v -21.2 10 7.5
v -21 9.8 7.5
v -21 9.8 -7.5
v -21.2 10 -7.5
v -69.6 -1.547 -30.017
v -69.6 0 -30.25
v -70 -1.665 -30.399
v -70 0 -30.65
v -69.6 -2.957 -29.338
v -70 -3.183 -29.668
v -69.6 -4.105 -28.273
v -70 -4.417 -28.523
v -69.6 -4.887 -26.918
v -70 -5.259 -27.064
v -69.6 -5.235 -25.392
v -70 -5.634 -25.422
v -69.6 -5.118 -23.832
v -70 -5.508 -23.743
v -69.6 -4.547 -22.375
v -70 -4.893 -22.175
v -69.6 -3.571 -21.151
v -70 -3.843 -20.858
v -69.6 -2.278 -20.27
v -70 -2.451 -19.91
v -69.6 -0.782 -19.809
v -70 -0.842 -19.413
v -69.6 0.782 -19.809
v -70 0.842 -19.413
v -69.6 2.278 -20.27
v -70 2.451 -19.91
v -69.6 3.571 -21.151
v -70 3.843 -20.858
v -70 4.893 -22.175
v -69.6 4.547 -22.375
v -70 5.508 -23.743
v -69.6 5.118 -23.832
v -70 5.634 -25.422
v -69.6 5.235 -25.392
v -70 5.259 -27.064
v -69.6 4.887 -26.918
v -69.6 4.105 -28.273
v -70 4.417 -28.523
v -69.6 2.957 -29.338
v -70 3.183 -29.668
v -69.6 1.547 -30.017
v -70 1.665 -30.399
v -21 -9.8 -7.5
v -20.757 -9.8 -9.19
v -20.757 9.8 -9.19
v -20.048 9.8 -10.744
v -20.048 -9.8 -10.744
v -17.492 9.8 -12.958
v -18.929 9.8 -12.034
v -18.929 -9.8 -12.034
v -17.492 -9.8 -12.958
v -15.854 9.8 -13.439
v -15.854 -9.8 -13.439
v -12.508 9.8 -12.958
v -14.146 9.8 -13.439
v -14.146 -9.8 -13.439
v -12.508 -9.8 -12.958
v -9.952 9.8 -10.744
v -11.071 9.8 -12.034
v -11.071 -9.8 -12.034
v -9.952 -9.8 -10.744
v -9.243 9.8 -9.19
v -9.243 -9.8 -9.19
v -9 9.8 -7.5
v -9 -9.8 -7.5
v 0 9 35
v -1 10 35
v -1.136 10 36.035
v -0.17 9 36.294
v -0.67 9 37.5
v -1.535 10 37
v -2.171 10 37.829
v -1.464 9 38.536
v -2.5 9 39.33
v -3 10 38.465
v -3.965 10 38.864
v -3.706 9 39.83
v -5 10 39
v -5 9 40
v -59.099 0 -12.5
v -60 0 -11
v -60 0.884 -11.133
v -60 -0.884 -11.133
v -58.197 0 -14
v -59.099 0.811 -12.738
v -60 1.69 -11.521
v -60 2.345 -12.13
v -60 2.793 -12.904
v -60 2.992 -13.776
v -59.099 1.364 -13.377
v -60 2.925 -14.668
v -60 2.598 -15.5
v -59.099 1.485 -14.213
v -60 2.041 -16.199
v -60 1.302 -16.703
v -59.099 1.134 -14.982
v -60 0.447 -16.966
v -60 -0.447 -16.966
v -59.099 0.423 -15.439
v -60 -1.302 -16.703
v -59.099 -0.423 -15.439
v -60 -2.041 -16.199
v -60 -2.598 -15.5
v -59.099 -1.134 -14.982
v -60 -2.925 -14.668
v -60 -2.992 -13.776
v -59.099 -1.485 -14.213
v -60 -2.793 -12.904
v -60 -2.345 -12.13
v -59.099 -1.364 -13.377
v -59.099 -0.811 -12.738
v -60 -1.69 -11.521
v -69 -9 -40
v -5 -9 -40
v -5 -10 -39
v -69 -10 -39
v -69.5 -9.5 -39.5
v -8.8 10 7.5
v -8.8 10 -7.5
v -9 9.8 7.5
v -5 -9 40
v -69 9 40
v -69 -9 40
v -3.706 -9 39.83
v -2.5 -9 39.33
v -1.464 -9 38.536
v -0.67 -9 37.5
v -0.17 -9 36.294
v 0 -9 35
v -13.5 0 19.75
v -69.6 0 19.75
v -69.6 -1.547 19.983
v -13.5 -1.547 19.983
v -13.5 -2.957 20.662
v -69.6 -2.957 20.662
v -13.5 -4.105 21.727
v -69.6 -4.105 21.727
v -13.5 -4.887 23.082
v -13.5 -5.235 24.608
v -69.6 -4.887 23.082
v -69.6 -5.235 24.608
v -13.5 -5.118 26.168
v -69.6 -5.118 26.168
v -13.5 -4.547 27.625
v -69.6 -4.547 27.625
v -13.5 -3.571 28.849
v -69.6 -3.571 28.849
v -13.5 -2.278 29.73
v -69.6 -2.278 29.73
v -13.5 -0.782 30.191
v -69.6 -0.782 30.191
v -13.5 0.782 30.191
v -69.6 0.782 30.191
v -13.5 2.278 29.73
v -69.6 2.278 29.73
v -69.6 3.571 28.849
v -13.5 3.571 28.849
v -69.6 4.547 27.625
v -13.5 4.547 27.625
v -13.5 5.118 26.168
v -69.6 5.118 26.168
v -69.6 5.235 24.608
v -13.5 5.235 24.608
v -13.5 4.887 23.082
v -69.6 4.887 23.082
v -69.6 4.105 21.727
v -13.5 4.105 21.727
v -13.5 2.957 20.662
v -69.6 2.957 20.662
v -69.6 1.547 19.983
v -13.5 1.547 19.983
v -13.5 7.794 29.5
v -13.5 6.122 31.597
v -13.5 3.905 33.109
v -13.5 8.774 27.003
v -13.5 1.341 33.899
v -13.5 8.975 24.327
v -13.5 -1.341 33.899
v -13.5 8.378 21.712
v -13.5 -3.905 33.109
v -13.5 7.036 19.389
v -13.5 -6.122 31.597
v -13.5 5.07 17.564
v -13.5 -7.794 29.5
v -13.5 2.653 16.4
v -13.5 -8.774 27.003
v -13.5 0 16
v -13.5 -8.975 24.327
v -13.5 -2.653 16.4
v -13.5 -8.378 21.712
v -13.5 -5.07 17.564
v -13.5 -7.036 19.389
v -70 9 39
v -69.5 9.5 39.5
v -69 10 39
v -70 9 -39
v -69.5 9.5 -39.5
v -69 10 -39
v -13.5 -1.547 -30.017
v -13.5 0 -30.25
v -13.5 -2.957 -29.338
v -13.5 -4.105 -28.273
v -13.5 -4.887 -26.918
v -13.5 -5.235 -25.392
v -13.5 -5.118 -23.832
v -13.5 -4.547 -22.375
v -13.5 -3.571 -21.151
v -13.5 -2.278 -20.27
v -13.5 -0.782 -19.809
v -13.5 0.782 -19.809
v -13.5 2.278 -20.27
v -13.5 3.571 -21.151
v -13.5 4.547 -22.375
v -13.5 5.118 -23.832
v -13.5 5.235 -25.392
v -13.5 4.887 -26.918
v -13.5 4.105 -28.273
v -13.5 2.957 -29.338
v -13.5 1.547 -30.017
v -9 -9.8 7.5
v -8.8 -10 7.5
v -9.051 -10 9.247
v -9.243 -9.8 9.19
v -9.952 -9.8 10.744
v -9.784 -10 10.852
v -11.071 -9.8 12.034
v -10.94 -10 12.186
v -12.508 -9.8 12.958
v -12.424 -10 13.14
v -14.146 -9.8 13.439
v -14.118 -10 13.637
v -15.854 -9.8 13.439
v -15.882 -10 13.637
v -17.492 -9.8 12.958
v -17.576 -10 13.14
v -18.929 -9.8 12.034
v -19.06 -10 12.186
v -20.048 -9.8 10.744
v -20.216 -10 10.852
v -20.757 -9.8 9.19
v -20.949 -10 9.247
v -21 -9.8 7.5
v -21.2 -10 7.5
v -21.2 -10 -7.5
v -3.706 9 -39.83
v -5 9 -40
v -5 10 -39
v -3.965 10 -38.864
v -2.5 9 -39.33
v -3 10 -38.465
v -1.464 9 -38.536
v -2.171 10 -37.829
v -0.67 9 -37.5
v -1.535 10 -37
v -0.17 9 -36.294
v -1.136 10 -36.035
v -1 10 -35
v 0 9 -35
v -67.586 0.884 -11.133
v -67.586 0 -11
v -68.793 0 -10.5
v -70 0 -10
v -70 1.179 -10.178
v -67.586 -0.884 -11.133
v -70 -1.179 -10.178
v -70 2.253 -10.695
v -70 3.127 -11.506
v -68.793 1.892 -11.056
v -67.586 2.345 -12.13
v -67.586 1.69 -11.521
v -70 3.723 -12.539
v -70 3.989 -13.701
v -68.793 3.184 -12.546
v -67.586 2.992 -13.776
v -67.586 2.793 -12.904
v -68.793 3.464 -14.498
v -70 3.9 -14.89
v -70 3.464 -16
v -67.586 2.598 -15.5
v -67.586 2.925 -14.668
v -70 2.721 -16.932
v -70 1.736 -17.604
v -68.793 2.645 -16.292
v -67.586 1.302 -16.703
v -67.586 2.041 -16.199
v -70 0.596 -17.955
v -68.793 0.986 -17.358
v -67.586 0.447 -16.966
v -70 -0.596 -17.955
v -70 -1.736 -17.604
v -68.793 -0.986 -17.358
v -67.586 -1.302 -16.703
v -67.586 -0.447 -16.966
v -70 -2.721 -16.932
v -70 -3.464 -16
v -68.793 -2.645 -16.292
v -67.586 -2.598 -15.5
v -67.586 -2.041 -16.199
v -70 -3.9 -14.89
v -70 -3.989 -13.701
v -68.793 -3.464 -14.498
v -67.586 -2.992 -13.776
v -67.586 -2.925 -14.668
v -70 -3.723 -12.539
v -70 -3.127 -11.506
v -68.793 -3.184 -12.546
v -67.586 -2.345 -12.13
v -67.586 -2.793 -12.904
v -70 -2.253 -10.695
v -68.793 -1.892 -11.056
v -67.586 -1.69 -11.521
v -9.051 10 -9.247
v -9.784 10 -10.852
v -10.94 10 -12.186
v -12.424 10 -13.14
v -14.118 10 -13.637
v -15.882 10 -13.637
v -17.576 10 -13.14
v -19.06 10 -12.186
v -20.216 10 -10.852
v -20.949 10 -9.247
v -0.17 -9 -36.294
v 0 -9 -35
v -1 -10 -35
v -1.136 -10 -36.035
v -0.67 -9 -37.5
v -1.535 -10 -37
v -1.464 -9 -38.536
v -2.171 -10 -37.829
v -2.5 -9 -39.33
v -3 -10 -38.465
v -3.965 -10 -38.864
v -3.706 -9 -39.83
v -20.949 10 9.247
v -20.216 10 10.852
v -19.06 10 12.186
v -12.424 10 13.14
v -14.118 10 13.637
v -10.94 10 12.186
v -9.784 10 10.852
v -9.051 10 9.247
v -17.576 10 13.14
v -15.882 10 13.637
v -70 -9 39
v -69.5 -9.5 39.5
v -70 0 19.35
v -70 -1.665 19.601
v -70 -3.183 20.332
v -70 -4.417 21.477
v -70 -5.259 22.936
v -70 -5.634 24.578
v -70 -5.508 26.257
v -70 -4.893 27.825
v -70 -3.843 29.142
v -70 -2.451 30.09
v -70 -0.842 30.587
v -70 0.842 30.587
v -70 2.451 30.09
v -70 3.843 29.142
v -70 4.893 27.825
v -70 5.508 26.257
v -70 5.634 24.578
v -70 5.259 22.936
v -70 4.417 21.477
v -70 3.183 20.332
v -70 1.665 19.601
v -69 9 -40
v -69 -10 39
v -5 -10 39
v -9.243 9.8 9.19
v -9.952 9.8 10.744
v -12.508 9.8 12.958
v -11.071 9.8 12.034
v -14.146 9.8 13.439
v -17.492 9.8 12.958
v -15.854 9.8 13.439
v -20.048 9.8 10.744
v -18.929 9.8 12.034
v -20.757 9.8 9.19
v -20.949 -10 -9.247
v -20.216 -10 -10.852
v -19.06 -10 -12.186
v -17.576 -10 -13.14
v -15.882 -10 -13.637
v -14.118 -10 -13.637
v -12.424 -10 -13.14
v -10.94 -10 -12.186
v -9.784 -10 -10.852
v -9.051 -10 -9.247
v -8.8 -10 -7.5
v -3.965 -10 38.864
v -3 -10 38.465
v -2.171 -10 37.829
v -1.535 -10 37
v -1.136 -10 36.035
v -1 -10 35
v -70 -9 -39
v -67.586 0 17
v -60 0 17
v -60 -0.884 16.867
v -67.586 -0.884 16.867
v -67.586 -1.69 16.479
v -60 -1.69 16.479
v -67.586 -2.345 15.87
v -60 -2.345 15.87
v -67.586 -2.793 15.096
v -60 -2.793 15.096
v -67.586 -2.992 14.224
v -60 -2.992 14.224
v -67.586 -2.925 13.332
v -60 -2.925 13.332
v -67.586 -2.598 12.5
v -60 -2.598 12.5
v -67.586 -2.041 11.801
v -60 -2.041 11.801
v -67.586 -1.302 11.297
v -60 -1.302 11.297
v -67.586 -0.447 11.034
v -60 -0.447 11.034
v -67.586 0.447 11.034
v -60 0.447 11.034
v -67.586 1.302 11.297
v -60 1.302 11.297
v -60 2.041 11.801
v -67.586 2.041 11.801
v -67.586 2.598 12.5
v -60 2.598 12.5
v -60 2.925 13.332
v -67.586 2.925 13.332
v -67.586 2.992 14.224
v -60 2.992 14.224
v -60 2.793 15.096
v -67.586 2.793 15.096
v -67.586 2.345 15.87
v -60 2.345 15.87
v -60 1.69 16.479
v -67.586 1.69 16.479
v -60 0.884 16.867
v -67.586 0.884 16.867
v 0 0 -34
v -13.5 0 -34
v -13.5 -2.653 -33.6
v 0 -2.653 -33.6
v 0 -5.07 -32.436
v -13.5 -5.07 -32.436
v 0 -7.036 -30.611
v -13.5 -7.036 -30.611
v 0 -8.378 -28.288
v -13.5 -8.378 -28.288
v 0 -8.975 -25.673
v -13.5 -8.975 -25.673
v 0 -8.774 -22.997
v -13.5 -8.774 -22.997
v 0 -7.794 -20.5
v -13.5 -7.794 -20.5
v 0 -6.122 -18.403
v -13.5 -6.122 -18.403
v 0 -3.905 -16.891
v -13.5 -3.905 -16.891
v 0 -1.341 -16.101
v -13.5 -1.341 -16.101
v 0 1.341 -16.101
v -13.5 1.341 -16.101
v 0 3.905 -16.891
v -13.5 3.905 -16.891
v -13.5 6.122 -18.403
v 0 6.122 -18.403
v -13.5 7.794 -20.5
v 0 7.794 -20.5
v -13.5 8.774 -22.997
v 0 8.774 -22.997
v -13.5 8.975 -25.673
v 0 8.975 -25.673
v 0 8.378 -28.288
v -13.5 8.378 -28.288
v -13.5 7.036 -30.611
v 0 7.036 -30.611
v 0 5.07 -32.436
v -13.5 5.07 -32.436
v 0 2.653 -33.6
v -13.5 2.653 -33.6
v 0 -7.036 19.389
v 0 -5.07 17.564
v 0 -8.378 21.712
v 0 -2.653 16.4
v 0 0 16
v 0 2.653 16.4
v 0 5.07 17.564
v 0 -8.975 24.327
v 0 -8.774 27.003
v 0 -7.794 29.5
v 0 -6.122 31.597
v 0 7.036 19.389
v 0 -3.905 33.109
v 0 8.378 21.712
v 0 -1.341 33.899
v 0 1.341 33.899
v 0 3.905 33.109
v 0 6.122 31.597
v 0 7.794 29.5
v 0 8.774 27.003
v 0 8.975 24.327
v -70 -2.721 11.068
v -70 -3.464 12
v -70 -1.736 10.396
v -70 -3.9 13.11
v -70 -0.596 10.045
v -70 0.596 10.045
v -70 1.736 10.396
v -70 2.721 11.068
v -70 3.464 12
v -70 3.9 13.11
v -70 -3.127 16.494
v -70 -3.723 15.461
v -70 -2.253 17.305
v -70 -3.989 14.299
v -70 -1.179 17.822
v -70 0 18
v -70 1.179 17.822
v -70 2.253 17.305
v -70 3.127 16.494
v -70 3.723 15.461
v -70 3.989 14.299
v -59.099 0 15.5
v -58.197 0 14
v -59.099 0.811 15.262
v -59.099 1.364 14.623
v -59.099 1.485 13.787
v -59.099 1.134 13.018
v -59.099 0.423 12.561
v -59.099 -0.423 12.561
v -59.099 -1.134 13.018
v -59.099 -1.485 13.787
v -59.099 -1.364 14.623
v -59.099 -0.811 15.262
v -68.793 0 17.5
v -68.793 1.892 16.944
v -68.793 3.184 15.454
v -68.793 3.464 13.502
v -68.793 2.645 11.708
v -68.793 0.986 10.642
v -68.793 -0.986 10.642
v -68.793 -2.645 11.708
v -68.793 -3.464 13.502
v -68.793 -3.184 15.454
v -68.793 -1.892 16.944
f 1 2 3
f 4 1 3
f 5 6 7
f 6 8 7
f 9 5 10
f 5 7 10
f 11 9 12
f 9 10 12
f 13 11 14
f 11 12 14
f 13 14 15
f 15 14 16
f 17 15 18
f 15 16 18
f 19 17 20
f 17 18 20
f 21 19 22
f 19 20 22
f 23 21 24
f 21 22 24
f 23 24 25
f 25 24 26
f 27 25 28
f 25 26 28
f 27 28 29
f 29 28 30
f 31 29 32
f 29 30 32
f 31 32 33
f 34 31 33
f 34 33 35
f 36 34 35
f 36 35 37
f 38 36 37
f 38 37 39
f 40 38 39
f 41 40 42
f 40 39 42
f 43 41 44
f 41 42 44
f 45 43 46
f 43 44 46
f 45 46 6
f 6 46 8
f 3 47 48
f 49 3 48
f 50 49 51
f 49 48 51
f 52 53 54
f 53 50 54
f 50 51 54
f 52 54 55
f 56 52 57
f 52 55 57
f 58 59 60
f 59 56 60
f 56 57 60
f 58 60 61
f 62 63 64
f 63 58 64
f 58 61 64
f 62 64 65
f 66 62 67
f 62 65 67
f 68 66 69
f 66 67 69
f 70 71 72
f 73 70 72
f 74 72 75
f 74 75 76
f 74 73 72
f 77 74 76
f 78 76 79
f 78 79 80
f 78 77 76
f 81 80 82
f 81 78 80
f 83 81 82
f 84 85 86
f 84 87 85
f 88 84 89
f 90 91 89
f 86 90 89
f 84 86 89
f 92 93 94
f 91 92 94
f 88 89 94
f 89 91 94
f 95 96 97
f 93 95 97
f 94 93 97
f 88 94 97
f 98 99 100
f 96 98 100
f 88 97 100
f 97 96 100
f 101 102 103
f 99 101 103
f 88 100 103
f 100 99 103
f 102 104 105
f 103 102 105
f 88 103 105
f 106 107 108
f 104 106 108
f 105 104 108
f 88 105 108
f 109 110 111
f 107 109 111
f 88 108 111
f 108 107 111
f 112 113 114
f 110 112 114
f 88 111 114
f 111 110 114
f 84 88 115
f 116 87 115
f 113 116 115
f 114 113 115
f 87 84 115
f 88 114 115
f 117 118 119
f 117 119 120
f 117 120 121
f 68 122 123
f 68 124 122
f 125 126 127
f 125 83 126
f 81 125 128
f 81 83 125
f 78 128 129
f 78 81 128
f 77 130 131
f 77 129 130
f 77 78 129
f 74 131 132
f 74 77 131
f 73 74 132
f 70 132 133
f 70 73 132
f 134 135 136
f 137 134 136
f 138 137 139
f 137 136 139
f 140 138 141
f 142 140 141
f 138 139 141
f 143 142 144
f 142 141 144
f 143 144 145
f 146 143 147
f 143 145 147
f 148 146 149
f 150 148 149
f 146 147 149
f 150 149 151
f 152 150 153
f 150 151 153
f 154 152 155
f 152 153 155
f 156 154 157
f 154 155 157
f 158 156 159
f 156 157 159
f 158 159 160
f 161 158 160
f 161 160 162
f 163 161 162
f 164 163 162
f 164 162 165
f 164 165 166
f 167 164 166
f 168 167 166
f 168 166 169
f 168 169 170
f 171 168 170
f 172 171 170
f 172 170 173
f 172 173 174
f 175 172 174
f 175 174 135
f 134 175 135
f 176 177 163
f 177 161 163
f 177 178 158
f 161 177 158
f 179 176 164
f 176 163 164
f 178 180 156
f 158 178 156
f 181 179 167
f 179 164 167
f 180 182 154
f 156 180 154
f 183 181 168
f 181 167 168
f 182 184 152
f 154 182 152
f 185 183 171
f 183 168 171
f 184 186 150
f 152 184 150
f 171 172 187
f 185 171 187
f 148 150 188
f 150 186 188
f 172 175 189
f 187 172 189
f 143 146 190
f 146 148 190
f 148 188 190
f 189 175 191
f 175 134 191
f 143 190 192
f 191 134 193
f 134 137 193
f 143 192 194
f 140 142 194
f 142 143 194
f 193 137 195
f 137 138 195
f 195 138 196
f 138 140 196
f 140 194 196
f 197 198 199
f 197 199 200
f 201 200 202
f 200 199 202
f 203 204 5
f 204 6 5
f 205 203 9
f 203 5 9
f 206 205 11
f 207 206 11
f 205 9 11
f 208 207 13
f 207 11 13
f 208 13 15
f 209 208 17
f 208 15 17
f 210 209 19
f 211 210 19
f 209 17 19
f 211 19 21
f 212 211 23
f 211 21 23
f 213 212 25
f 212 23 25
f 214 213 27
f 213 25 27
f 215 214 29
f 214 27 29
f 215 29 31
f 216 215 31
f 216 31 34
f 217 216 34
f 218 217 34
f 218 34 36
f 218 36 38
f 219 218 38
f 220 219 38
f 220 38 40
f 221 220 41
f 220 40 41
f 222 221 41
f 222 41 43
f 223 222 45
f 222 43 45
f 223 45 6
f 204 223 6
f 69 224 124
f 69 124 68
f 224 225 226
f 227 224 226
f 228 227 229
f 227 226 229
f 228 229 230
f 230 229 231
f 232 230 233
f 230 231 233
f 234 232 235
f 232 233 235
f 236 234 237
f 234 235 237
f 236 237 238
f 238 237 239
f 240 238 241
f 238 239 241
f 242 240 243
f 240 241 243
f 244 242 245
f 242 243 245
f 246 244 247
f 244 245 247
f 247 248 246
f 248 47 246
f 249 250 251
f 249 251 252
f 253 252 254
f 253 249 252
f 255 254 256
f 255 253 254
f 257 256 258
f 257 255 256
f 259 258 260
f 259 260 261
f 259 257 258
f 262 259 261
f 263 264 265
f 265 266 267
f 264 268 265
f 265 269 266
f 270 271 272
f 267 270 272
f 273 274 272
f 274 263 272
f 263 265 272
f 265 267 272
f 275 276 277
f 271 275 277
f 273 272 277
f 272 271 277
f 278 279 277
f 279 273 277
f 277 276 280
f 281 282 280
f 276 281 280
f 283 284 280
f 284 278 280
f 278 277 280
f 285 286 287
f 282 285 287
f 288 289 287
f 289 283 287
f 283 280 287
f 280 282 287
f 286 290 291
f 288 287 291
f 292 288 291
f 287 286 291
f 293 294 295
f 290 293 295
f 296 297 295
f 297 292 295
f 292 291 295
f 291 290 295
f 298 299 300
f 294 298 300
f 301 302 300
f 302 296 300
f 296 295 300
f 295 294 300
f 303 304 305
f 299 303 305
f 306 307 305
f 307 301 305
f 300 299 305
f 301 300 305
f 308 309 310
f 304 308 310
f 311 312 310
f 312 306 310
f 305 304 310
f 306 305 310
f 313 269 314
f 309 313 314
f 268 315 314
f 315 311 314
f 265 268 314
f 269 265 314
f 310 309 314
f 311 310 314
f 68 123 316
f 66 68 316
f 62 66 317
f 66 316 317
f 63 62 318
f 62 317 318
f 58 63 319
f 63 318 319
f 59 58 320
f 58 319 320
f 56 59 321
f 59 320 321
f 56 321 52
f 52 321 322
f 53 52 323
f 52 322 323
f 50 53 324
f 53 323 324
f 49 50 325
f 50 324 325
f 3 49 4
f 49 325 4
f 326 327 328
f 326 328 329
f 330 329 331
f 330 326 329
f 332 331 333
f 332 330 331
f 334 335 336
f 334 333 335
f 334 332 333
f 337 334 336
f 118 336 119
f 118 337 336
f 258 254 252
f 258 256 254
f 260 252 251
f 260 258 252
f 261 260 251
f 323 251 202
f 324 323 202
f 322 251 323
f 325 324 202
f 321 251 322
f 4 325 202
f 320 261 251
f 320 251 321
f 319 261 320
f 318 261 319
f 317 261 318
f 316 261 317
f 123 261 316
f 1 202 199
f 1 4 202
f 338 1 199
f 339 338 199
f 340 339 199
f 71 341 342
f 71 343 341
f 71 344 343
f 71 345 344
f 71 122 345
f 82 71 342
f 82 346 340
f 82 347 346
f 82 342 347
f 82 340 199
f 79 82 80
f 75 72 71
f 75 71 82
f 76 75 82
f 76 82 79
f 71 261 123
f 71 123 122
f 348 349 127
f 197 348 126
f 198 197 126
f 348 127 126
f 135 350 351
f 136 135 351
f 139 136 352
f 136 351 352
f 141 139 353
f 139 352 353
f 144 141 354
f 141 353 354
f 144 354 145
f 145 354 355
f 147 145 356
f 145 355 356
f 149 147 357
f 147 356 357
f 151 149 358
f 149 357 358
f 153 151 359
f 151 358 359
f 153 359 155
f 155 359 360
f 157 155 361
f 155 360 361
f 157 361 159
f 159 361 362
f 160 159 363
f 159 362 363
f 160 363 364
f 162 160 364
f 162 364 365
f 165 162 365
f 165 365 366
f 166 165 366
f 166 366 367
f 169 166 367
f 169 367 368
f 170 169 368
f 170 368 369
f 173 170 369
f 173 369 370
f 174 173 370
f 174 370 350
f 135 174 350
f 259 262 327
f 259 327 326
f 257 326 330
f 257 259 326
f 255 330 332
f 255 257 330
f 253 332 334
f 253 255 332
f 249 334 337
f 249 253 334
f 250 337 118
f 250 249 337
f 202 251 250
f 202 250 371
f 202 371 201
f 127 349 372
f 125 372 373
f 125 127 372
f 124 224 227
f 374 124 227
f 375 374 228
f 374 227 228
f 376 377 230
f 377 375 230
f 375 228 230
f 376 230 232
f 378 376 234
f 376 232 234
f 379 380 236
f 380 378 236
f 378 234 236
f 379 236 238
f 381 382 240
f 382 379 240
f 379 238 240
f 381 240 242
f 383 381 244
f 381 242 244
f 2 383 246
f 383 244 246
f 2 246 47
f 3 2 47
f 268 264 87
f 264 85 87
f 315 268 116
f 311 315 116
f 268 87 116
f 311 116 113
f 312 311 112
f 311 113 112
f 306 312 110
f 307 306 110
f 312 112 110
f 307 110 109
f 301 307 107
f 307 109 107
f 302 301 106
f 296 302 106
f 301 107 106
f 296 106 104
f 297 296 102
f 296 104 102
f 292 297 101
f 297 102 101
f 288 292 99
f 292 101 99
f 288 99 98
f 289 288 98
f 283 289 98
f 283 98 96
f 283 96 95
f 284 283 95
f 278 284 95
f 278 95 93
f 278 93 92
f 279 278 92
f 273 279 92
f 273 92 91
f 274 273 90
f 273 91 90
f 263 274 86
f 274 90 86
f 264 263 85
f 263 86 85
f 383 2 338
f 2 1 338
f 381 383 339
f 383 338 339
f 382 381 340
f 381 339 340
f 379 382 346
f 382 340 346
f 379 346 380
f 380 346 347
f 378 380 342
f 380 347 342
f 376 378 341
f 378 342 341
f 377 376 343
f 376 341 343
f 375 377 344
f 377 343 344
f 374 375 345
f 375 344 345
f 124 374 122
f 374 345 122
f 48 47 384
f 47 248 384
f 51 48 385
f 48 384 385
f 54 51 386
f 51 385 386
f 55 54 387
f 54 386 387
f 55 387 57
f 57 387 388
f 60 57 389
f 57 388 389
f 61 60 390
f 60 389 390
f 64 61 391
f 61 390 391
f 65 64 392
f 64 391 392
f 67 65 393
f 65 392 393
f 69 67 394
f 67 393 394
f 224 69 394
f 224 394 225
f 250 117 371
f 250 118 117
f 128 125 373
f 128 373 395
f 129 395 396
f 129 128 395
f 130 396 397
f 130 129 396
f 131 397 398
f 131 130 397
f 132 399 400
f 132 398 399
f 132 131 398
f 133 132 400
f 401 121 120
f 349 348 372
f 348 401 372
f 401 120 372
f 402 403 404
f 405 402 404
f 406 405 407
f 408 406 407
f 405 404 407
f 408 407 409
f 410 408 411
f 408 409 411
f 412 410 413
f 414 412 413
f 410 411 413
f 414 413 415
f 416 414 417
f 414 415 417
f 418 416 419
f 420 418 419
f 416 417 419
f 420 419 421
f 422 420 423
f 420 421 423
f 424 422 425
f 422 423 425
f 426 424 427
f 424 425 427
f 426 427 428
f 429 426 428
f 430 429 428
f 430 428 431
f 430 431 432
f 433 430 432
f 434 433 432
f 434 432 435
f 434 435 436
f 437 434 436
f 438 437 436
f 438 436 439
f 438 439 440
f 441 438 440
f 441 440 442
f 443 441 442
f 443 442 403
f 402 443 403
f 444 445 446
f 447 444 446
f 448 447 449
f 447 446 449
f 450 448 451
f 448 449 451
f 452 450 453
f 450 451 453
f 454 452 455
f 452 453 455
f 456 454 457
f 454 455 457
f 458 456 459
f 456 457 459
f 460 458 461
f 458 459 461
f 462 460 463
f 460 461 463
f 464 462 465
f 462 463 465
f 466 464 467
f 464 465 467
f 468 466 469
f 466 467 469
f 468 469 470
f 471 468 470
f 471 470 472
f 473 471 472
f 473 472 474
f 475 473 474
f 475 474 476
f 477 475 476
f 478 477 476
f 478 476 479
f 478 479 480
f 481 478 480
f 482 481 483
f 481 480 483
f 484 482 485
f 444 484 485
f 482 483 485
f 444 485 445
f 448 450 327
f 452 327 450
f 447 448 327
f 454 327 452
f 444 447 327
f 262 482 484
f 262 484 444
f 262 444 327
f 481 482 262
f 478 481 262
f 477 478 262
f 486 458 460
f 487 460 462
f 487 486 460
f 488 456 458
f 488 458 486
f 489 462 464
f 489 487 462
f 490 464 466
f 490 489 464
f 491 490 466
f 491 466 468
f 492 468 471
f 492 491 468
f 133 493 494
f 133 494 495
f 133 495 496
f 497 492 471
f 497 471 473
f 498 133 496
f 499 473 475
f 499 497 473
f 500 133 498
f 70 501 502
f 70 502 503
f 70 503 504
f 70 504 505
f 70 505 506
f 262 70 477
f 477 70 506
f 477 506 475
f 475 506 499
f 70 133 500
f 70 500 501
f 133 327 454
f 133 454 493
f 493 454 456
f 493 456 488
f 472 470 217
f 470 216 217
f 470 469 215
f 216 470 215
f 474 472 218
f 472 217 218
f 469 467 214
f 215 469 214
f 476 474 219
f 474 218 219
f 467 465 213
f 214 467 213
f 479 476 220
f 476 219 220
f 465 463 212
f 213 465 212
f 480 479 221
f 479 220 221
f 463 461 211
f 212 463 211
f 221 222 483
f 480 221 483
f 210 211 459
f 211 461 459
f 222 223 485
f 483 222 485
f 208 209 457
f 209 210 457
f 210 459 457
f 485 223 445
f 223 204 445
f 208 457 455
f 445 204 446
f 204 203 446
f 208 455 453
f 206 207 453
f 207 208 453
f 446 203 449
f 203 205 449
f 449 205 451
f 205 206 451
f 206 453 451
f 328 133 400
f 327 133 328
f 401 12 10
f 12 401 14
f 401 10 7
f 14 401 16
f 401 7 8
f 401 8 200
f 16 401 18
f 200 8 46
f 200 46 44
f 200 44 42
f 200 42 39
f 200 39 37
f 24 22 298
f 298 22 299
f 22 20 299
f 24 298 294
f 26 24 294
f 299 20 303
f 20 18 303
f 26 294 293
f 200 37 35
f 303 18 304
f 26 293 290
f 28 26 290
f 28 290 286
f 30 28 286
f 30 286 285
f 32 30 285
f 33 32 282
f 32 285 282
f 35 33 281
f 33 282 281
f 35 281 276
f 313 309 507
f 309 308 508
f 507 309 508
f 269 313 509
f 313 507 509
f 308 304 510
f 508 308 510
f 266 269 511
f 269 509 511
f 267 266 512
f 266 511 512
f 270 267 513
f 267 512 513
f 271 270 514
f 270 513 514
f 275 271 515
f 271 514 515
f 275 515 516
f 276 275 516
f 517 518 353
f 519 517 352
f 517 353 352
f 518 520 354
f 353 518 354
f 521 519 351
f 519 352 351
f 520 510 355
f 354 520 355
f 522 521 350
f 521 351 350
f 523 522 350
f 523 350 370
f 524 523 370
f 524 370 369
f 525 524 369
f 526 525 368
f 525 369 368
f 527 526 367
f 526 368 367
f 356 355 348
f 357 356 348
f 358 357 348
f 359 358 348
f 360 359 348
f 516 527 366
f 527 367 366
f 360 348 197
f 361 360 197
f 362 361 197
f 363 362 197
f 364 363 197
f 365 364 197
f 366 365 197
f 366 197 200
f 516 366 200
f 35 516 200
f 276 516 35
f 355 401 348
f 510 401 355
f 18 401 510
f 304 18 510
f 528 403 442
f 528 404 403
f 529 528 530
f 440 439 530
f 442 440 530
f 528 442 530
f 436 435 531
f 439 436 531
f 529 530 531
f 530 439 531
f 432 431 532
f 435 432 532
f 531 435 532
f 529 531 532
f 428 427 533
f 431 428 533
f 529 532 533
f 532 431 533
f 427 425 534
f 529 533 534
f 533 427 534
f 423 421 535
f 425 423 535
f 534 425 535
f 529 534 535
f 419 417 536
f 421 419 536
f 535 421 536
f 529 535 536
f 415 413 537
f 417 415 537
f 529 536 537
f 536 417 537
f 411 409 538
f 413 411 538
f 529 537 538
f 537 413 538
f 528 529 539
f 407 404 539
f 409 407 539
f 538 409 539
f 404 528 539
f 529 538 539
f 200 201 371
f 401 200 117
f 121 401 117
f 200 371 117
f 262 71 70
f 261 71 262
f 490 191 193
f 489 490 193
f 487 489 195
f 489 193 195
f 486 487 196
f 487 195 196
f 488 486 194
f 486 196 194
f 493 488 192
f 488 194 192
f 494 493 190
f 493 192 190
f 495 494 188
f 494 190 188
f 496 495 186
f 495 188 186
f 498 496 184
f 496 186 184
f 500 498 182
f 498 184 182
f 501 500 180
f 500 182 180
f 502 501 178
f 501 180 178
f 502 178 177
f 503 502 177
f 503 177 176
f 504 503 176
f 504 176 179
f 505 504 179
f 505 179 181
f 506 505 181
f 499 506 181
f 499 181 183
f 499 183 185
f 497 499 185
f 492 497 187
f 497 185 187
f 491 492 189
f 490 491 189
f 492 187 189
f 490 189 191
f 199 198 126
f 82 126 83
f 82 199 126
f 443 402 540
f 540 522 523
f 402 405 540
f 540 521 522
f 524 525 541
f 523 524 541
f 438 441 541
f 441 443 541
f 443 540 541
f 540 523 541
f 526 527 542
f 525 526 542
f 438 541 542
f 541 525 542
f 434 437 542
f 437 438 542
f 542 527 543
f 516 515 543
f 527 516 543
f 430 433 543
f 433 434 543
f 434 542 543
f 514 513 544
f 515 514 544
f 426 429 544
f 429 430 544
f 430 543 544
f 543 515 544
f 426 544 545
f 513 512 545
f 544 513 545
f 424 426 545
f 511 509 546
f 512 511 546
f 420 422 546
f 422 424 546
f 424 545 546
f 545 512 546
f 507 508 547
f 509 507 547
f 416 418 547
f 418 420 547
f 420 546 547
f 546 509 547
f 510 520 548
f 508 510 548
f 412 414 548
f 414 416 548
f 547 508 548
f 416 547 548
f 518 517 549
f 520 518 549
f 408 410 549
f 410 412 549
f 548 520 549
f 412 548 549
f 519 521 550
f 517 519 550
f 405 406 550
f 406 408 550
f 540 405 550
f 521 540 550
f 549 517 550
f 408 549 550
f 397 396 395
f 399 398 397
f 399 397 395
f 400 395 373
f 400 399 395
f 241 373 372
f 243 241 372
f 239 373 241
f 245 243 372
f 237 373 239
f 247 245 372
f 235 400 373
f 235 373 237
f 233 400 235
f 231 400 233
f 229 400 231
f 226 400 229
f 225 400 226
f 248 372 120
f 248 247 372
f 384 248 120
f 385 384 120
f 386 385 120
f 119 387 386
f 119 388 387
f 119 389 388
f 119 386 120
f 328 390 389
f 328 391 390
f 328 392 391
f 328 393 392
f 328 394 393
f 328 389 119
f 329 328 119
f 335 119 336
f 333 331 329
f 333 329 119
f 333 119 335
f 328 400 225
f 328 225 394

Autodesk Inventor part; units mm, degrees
ref_plane "YZ Plane" through (0, 0, 0) normal (1, 0, 0) x (0, 1, 0)
ref_plane "XZ Plane" through (0, 0, 0) normal (0, 1, 0) x (-1, 0, 0)
ref_plane "XY Plane" through (0, 0, 0) normal (0, 0, 1) x (1, 0, 0)
sketch "Эскиз1" plane through (0, 0, 0) normal (1, 0, 0) x (0, 1, 0)
  line L0 (-14, 0) -> (14, 0) projected
  line L1 (0, -56) -> (0, 56) projected
  line L2 (10, 40) -> (-10, 40)
  line L3 (-10, 40) -> (-10, -40)
  line L4 (-10, -40) -> (10, -40)
  line L5 (10, -40) -> (10, 40)
  point P0 (0, 0)
  dimension "d0" = 20
  dimension "d1" = 10
  dimension "d2" = 80
  dimension "d3" = 40
extrude "Выдавливание1" add sketch "Эскиз1" against normal blind 70
sketch "Эскиз2" plane through (0, 0, 0) normal (1, 0, 0) x (0, 1, 0)
  line L0 (0, 56) -> (0, -56) projected
  line L1 (0, -56) -> (0, 56) projected
  line L2 (-14, 0) -> (14, 0) projected
  circle A0 centre (0, 25) radius 5
  circle A1 centre (0, -25) radius 5
  line L3 (10, 40) -> (-10, 40) projected
  line L4 (-10, -40) -> (10, -40) projected
  point P0 (0, 0)
  dimension "d6" = 10
  dimension "d7" = 10
  dimension "d10" = 15
  dimension "d12" = 15
hole "Отверстие1" at (0, 0, 25) at (0, 0, -25) direction (-1, 0, 0) diameter 10.5 end through all counterbore diameter 18 counterbore depth 13.5
fillet "Сопряжение1" radius 5 2 edges at (0, 0, 40) (0, 0, -40)
chamfer "Фаска1" distance 1 angle 45 10 edges at (-37.5, 10, 40) (-1.4645, 10, 38.5355) (0, 10, 0) (-1.4645, 10, -38.5355) (-37.5, 10, -40) (-37.5, -10, 40) (-1.4645, -10, 38.5355) (0, -10, 0) (-1.4645, -10, -38.5355) (-37.5, -10, -40)
chamfer "Фаска2" distance 1 angle 45 4 edges at (-70, 10, 0) (-70, 0, 40) (-70, -10, 0) (-70, 0, -40)
sketch "Эскиз3" plane through (-70, 0, 0) normal (-1, 0, 0) x (0, 0, 1)
  line L0 (-56, 0) -> (56, 0) projected
  line L1 (0, 14) -> (0, -14) projected
  line L2 (-56, 0) -> (56, 0) projected
  circle A0 centre (-14, 0) radius 3
  circle A1 centre (14, 0) radius 3
  circle A2 centre (-25, 0) radius 5.25 projected
  circle A3 centre (25, 0) radius 5.25 projected
  point P0 (0, 0)
  dimension "d28" = 6
  dimension "d29" = 11
  dimension "d30" = 28
hole "Отверстие2" at (-70, 0, -14) at (-70, 0, 14) direction (1, 0, 0) diameter 6 depth 10 tip angle 118 countersink diameter 8 countersink angle 45
chamfer "Фаска3" distance 0.4 angle 45 2 edges at (-70, 0, -19.75) (-70, 0, 30.25)
sketch "Эскиз4" plane through (0, 0, 0) normal (0, 1, 0) x (-1, 0, 0)
  line L0 (69.6, 19.75) -> (13.5, 19.75) projected
  line L1 (69.6, -19.75) -> (13.5, -19.75) projected
  line L2 (70, -39) -> (70, 39) projected
  arc A0 (21, 7.5) -> (9, 7.5) centre (15, 7.5) ccw
  arc A1 (9, -7.5) -> (21, -7.5) centre (15, -7.5) ccw
  line L3 (15, 7.5) -> (15, -7.5) construction
  line L4 (-14, 0) -> (84, 0) projected
  line L5 (0, -56) -> (0, 56) projected
  line L6 (0, 25) -> (0, 25) projected
  line L7 (0, 25) -> (0, 25) projected
  line L8 (13.5, 34) -> (13.5, 16) projected
  line L9 (21, 7.5) -> (21, -7.5)
  line L10 (9, 7.5) -> (9, -7.5)
  point P0 (0, 0)
  dimension "d41" = 12
  dimension "d42" = 15
  dimension "d43" = 7.5
  dimension "d44" = 55
extrude "Выдавливание2" cut sketch "Эскиз4" along normal through all both and the other way through all
chamfer "Фаска4" distance 0.2 angle 45 8 edges at (-15, -10, 13.5) (-9, -10, 0) (-15, -10, -13.5) (-21, -10, 0) (-21, 10, 0) (-15, 10, -13.5) (-9, 10, 0) (-15, 10, 13.5)
properties part number "ОПОРА_01"
